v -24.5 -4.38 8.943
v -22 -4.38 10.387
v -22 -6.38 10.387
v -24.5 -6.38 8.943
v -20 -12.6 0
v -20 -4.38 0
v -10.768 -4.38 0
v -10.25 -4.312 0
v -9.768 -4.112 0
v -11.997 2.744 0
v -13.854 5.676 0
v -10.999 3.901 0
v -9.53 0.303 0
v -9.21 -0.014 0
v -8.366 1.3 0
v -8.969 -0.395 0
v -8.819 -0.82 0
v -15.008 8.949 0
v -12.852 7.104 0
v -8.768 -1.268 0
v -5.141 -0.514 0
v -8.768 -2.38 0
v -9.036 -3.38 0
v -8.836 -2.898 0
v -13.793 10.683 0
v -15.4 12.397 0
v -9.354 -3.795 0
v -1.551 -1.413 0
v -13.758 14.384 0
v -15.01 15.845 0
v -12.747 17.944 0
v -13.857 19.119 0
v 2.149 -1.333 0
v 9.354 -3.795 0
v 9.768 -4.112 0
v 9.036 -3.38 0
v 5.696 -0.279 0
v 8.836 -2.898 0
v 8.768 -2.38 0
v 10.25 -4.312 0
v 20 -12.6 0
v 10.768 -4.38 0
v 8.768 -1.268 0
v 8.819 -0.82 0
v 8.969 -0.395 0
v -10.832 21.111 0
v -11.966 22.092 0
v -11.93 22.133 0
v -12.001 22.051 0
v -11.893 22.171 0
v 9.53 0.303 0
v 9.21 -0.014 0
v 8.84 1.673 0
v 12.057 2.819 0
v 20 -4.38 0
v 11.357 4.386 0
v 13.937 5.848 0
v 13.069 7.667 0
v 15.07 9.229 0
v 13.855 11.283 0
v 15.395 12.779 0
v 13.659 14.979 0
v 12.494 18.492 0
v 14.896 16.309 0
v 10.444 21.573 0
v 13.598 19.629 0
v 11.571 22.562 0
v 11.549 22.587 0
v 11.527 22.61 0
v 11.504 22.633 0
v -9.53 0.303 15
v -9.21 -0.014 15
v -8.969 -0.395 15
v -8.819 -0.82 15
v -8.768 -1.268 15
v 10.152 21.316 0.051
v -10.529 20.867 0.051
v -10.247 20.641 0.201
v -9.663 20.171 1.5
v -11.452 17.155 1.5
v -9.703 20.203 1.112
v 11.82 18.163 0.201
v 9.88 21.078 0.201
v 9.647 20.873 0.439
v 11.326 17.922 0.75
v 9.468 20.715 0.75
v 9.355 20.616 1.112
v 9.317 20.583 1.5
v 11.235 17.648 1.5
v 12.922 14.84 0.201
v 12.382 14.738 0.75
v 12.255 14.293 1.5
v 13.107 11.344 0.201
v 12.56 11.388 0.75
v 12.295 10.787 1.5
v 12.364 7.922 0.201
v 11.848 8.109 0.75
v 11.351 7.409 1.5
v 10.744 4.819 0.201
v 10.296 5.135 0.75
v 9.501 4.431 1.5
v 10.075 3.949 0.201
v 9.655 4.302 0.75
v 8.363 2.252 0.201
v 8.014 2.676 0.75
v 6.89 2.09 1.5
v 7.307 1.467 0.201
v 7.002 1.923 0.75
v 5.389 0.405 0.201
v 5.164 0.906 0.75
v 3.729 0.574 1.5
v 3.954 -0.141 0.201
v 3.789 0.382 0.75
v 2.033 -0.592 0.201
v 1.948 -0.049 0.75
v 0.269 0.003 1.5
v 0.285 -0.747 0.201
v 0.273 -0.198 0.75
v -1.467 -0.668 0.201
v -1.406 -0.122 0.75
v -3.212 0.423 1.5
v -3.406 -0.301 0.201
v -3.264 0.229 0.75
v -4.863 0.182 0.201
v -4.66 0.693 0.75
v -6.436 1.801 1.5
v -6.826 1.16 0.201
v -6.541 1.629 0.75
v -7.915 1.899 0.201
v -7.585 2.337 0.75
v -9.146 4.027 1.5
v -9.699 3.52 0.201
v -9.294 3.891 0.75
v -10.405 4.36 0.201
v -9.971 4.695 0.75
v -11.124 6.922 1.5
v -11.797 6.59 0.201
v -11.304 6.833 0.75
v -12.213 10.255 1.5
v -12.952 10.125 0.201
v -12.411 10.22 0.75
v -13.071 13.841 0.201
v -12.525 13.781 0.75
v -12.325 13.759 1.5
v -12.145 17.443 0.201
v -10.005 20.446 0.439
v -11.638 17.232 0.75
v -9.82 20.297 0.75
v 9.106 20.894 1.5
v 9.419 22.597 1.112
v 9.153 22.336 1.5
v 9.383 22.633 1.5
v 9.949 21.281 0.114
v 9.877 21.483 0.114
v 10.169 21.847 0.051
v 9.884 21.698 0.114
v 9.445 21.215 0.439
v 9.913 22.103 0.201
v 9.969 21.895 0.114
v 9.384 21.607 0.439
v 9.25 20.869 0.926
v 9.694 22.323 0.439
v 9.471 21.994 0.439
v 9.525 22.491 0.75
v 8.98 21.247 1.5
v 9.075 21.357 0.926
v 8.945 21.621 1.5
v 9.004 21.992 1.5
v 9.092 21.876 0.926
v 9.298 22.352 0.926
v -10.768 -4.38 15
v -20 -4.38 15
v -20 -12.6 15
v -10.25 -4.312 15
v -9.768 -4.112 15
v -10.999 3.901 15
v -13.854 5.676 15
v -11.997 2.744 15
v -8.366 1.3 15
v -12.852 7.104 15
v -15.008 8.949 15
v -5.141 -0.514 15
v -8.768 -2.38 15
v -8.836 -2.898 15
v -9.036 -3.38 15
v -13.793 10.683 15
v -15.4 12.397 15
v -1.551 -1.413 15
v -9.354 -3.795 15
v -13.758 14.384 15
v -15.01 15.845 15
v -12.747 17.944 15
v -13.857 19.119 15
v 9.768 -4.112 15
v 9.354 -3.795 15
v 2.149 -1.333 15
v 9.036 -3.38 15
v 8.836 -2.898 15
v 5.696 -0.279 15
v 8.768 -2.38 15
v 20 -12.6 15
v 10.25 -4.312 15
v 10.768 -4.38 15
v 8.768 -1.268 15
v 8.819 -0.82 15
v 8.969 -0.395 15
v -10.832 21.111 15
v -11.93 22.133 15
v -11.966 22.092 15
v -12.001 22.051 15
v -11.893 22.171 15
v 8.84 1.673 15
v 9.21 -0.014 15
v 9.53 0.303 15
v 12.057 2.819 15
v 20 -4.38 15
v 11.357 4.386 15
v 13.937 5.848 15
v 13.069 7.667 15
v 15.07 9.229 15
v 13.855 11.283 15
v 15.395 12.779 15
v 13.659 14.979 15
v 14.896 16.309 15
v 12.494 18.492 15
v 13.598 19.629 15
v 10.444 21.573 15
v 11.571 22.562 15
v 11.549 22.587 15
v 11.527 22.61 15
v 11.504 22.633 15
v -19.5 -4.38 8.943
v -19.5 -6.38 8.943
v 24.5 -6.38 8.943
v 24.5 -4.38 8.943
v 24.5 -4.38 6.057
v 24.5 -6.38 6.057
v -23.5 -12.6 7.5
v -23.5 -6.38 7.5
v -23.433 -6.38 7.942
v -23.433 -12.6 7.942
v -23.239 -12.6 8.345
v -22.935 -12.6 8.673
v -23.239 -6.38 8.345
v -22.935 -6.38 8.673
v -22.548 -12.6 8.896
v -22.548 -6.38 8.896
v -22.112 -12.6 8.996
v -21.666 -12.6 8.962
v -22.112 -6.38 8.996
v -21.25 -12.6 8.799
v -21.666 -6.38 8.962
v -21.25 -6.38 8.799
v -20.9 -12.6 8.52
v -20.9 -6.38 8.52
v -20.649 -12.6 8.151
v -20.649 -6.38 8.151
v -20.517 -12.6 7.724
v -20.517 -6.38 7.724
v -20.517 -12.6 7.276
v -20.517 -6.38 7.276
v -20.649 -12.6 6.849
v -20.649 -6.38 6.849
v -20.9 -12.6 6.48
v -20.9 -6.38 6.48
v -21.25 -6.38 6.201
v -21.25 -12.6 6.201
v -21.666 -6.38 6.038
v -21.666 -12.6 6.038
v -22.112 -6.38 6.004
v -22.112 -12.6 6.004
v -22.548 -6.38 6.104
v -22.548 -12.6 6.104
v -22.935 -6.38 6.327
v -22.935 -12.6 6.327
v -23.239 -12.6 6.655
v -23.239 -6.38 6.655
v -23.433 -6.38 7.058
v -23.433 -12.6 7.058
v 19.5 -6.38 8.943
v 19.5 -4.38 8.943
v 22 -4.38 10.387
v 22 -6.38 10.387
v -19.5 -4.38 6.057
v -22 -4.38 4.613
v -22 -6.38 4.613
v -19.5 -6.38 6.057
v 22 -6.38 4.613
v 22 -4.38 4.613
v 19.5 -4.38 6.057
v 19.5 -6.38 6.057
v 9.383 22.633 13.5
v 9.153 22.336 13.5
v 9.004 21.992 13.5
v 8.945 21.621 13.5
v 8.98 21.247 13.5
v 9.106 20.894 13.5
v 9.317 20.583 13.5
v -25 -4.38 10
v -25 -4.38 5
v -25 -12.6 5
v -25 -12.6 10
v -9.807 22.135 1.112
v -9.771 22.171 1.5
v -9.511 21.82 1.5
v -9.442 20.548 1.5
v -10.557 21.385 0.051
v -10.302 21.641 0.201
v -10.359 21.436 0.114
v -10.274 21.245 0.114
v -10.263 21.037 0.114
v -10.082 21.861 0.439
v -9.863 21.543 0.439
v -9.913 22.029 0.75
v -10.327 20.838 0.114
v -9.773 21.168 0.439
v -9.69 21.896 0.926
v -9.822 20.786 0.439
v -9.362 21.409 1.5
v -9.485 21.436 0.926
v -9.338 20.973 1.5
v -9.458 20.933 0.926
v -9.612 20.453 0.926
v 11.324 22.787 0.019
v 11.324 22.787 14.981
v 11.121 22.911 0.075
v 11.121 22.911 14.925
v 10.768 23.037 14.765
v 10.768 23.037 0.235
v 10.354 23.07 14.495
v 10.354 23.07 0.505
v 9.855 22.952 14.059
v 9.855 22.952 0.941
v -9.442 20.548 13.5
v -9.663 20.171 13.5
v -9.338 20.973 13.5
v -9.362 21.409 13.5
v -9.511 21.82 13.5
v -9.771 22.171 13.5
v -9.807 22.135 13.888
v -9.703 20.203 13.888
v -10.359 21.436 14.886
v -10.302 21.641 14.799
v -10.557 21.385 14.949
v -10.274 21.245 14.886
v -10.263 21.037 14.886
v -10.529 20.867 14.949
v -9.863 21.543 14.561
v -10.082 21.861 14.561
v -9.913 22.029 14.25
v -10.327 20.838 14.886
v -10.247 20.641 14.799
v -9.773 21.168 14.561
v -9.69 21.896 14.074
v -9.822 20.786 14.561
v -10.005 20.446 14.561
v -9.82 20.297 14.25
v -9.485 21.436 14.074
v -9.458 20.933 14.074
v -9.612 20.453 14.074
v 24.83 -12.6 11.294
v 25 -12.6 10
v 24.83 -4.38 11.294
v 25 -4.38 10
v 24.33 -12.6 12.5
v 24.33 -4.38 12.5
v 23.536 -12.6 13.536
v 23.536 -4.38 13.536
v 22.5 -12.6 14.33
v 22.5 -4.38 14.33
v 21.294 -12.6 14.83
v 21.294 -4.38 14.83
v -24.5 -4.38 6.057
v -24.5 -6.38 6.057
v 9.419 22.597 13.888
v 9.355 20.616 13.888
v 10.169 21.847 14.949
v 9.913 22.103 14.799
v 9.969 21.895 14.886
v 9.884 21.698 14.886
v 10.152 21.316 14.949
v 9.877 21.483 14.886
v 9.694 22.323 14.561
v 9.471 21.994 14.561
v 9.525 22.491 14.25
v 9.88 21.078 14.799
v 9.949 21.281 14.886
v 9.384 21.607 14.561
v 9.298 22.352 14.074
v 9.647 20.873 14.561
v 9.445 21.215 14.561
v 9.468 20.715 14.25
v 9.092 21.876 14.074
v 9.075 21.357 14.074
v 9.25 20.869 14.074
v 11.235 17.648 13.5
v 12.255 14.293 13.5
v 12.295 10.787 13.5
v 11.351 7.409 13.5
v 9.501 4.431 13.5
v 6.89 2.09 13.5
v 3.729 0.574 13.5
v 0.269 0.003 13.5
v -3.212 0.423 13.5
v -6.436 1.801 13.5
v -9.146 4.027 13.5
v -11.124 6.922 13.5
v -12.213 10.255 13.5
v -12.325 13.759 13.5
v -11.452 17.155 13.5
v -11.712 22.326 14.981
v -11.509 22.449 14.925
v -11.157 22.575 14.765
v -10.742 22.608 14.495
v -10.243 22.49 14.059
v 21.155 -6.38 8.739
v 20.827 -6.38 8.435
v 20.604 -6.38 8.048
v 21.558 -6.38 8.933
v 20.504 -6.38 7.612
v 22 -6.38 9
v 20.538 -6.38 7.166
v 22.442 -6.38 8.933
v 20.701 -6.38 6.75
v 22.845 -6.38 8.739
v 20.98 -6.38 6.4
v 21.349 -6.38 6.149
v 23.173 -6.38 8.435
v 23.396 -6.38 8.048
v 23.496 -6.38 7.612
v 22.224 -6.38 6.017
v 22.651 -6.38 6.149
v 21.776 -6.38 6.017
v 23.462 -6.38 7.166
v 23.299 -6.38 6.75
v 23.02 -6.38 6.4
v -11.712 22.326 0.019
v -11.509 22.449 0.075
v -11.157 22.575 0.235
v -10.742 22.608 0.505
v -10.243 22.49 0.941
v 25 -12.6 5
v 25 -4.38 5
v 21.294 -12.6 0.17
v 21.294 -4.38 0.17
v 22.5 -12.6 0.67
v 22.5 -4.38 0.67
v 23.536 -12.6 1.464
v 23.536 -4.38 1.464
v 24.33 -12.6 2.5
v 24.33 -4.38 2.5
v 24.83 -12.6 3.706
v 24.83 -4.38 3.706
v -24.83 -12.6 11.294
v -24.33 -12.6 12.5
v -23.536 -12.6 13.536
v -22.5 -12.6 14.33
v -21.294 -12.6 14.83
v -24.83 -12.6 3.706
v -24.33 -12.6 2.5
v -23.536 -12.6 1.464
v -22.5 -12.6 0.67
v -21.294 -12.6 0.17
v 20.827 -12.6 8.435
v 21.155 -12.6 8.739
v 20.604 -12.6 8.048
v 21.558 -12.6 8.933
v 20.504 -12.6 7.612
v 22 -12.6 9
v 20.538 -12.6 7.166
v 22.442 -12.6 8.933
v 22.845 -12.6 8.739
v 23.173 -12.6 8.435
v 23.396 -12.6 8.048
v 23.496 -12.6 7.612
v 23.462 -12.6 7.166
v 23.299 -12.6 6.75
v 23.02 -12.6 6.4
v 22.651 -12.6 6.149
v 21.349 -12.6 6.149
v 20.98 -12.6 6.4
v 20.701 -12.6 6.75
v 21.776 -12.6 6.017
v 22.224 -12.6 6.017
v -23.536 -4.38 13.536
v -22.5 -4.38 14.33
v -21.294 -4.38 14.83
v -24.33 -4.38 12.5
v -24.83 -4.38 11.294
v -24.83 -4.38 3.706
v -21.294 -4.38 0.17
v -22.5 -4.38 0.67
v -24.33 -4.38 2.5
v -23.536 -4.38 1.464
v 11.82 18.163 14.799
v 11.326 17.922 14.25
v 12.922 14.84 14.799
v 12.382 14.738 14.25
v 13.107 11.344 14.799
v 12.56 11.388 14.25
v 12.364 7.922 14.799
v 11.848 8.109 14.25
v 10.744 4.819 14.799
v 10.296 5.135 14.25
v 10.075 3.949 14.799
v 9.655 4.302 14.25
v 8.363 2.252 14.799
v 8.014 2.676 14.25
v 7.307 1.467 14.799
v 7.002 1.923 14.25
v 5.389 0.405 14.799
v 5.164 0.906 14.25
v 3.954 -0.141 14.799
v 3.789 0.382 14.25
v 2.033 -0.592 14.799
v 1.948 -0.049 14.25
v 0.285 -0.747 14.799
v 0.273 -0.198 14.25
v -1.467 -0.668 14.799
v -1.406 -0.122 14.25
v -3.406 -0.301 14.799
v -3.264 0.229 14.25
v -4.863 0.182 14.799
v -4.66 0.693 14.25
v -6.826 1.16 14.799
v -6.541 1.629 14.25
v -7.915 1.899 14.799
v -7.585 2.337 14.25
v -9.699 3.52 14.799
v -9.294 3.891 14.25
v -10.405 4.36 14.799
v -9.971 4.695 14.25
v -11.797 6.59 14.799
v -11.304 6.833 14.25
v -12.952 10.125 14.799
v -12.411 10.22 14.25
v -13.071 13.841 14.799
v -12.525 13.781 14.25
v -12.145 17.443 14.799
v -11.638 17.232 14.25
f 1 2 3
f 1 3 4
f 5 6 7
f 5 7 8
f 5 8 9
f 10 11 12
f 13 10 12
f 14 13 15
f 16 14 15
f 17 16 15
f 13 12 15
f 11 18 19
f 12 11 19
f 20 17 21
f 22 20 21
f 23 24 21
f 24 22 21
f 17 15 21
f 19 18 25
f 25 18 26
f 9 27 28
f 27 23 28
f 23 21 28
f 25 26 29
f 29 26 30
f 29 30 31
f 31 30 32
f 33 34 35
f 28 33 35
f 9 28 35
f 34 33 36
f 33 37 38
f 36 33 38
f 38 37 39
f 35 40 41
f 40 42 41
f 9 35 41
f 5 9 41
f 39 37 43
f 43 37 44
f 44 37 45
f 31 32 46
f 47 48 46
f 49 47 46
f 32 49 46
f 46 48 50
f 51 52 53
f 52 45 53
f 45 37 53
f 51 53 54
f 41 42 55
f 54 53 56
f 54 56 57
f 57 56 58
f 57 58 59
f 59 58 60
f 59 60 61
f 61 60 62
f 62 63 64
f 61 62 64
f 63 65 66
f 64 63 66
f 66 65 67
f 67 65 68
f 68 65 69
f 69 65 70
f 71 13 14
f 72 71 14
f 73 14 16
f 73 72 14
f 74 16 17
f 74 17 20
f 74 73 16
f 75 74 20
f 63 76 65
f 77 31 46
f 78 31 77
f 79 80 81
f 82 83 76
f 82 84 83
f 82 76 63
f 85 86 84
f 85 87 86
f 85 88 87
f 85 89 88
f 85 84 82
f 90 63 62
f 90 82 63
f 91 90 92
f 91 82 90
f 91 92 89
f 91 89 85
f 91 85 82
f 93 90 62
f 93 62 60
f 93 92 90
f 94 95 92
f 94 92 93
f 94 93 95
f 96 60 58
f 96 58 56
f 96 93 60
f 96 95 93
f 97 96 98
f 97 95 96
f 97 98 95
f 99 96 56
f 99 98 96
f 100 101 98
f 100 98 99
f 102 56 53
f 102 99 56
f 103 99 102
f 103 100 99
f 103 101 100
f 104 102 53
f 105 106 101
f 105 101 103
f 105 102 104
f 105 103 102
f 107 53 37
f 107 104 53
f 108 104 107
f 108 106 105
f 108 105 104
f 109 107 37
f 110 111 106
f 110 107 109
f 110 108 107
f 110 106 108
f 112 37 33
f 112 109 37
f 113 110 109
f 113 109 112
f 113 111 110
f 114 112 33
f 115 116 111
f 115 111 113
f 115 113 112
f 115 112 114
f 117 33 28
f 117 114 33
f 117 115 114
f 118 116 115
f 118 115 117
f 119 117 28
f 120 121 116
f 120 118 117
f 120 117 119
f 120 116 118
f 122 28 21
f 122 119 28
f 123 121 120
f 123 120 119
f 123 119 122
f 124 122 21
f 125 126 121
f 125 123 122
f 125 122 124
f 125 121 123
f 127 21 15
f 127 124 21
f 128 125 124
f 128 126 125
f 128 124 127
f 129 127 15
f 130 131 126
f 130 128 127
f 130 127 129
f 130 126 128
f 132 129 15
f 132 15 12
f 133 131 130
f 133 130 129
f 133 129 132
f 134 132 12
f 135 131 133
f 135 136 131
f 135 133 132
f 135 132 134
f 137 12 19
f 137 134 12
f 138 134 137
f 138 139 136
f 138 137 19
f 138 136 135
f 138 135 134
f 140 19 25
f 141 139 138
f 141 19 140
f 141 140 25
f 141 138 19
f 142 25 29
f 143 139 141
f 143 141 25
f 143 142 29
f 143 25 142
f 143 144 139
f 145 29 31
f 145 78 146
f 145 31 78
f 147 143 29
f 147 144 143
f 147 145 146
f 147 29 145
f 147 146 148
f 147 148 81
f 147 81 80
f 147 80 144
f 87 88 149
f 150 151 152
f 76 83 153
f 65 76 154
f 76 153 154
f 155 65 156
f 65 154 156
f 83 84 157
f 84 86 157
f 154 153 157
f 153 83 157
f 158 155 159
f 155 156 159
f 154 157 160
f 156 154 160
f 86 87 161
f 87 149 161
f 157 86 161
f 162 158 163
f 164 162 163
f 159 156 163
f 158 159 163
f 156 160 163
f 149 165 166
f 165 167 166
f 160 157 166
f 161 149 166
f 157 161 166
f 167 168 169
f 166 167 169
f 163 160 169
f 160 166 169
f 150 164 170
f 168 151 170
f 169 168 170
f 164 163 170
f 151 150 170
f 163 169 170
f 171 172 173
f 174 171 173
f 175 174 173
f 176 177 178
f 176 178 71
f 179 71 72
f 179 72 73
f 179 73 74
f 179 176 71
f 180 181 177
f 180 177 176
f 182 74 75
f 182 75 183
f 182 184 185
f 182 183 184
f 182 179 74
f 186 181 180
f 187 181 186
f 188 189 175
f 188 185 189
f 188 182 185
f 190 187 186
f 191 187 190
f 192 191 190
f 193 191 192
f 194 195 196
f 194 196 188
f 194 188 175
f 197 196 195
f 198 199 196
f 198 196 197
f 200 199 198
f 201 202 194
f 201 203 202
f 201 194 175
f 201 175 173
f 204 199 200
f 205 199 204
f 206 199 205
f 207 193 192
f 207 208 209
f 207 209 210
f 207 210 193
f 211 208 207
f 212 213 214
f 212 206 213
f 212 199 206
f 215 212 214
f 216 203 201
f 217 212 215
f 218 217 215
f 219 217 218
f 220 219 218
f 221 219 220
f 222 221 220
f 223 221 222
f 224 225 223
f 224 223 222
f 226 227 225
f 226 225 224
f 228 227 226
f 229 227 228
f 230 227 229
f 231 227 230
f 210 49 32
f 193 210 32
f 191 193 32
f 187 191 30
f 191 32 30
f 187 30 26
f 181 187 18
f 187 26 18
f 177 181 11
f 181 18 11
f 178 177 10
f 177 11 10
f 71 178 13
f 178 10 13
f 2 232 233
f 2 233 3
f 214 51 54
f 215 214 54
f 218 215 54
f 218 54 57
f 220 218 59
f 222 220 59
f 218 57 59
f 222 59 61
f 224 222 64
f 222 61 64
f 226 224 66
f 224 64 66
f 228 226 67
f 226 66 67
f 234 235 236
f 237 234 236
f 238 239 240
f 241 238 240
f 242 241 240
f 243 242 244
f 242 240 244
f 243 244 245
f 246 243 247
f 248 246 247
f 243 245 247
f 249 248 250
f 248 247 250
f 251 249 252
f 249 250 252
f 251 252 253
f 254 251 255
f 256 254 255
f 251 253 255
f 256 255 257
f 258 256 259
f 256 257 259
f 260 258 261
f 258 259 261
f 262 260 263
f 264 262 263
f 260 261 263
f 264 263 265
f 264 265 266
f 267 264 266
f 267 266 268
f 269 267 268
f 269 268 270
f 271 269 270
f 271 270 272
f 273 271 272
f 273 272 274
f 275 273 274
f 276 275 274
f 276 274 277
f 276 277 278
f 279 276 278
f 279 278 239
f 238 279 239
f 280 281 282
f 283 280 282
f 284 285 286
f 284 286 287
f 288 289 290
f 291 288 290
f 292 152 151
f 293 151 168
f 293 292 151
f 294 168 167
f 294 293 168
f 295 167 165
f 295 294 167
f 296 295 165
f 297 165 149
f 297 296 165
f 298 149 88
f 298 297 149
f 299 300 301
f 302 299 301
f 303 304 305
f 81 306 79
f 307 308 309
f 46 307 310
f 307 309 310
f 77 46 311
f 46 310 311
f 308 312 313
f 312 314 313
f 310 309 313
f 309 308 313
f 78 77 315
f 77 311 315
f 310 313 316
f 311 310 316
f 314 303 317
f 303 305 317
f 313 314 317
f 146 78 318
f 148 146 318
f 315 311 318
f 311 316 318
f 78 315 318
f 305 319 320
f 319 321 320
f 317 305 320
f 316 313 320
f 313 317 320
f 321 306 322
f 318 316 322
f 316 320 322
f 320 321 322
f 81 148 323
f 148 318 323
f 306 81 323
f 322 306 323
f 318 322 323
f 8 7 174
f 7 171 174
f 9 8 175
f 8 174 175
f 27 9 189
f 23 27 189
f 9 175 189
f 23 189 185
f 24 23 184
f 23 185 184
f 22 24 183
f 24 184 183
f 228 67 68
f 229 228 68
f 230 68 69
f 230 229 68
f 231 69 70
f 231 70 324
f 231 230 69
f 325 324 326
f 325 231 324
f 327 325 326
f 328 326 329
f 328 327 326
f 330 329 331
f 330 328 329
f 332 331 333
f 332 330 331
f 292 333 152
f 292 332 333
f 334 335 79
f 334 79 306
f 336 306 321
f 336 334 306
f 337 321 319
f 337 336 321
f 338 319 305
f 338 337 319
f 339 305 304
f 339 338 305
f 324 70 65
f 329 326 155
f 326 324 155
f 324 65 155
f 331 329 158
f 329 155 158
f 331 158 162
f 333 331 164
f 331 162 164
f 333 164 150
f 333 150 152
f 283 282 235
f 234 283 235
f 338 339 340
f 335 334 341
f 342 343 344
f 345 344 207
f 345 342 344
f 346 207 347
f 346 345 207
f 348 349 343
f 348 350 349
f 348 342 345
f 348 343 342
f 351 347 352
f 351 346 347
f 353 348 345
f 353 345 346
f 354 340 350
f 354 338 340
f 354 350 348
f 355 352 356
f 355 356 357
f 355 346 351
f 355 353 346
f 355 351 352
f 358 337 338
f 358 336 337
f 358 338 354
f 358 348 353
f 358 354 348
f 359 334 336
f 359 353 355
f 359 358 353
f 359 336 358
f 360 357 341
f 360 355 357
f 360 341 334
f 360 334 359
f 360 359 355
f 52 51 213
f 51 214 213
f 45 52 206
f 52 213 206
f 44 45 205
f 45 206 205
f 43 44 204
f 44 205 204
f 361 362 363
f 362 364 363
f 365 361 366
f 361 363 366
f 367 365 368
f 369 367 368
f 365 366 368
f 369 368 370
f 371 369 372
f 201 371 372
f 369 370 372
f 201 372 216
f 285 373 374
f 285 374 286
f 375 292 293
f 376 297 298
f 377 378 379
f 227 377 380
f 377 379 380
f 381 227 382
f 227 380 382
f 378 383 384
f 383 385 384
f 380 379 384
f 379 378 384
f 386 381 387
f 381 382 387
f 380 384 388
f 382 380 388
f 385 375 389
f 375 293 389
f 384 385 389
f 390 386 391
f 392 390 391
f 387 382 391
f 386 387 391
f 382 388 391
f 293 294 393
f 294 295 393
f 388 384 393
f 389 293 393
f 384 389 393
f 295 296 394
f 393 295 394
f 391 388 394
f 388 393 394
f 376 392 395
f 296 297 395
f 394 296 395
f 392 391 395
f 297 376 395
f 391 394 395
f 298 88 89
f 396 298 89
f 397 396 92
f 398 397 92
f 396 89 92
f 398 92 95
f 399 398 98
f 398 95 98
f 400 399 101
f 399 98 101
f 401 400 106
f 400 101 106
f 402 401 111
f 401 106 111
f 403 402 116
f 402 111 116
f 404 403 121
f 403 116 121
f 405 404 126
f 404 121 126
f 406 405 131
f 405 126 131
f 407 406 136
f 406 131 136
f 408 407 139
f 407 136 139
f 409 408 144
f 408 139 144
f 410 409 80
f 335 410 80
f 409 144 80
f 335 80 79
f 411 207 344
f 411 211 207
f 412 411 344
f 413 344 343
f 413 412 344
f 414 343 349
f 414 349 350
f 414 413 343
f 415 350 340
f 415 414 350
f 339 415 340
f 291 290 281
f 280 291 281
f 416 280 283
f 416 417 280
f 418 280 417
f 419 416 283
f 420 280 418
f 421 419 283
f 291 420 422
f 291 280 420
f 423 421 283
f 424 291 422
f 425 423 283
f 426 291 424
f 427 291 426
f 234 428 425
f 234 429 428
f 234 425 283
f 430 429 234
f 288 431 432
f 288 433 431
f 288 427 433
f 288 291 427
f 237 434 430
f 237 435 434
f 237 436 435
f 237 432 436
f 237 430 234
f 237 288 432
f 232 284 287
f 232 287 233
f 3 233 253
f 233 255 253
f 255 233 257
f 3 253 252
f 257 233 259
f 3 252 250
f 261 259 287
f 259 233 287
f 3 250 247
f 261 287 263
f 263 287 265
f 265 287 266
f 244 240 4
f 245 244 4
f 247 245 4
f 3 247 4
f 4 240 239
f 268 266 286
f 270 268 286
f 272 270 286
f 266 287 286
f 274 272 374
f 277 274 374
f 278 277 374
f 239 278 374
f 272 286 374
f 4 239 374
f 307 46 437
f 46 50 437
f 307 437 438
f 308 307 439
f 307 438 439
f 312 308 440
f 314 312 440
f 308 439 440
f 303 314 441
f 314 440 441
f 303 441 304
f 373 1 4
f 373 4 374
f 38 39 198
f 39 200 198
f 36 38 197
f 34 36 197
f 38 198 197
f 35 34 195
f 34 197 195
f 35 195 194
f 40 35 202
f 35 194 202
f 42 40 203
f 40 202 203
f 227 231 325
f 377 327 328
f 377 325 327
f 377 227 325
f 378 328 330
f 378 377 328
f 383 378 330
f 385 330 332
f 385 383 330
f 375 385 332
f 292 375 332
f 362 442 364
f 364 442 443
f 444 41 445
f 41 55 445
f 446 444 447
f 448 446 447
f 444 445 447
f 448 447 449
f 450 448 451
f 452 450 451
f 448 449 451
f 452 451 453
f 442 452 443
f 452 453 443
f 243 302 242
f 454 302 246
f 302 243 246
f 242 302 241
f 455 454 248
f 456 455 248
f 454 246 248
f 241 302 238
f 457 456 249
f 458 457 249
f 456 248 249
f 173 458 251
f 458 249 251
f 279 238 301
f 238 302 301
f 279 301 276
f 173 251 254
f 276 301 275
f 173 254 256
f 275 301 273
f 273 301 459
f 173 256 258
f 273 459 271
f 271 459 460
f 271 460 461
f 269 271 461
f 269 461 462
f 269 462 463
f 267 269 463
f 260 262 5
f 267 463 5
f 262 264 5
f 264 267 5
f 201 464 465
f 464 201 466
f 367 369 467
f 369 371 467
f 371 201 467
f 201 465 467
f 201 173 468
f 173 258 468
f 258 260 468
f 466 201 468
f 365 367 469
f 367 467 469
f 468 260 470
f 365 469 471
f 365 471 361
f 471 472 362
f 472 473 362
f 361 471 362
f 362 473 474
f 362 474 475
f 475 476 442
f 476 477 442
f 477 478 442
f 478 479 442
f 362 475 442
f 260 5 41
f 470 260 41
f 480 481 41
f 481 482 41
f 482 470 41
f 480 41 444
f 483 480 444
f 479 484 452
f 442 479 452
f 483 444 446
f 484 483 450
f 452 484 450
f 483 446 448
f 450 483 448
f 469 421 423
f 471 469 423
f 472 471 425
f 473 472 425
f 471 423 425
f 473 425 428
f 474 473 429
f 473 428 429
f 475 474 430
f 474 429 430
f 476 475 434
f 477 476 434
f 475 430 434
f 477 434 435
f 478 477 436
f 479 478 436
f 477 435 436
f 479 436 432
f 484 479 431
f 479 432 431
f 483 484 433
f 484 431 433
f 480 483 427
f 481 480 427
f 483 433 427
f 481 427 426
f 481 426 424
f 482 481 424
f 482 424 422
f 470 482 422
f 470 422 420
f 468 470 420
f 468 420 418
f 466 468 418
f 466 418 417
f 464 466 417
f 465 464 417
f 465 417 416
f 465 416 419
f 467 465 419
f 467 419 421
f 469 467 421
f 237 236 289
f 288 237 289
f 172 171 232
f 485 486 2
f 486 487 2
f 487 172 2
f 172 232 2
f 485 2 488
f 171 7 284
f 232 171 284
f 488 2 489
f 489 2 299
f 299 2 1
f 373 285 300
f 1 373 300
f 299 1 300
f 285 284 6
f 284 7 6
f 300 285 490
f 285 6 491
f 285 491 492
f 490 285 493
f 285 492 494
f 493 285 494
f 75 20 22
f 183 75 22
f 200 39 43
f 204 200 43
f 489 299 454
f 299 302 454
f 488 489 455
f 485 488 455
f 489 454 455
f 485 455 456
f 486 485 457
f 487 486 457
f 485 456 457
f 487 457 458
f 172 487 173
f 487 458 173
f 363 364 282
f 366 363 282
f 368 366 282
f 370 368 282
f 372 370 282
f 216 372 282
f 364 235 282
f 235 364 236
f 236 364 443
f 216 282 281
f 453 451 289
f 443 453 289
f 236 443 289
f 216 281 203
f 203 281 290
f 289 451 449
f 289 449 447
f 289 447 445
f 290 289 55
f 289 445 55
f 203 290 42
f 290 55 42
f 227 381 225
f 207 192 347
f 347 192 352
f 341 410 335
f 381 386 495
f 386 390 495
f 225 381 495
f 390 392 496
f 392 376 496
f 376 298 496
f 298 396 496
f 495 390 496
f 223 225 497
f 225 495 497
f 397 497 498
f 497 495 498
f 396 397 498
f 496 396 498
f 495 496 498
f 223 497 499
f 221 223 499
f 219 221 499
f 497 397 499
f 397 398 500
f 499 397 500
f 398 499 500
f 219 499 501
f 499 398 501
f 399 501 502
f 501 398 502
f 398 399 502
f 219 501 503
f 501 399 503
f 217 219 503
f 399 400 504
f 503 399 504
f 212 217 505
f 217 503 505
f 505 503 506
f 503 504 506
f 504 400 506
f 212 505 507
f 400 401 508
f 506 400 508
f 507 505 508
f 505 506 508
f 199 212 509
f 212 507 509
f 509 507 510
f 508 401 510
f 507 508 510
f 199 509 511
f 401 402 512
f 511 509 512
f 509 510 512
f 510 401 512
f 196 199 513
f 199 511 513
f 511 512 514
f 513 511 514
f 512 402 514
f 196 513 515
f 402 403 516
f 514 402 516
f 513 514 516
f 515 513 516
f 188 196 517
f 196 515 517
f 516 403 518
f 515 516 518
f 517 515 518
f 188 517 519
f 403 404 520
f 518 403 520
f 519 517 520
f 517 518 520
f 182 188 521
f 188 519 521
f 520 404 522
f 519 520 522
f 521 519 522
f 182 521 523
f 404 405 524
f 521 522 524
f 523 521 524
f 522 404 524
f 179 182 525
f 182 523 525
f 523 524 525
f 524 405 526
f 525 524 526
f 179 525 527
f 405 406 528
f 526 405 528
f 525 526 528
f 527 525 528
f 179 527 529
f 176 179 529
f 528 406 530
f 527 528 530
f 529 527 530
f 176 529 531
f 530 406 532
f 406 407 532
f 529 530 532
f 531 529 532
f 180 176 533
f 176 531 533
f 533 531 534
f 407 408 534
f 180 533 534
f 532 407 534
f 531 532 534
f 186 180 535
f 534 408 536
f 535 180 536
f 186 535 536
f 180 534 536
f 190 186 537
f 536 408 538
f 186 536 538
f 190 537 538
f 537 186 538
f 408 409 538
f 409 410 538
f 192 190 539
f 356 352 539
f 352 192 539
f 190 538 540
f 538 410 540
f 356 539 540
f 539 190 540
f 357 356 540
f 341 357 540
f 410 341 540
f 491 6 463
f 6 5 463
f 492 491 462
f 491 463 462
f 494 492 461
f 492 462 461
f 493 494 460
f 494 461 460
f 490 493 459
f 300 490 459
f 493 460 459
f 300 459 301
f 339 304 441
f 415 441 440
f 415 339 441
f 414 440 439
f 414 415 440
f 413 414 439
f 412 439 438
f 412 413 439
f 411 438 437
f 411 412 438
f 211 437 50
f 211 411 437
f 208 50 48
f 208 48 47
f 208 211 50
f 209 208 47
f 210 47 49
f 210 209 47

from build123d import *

# Parameters (mm, degrees)
RESSALTO_EXTRUS_O1_DEPTH = 15
ESBO_O3_R                = 1.5
CORTE_EXTRUS_O1_DEPTH    = 8.219669914
CORTE_EXTRUS_O2_DEPTH    = 2
FILETE1_R                = 1.5
FILETE2_R                = 2
FILETE3_R                = 5


with BuildPart() as part:
    # Esboço2 → Ressalto-extrusão1 (new body)
    with BuildSketch(Plane.XY):
        with BuildLine():
            Line((-25, -4.380330086), (-25, -12.6))
            Line((-25, -12.6), (25, -12.6))
            Line((25, -12.6), (25, -4.380330086))
            Line((25, -4.380330086), (8.768124087, -4.380330086))
            Line((8.768124087, -4.380330086), (8.768124087, -0.260173774))
            ThreePointArc((8.768124087, -0.260173774), (15.361943152, 11.318009898), (10.456147688, 23.706147688))
            Line((10.456147688, 23.706147688), (8.332817936, 21.582817936))
            ThreePointArc((8.332817936, 21.582817936), (0.30060873, 0.00364431), (-8.768124087, 21.168124087))
            Line((-8.768124087, 21.168124087), (-10.88944443, 23.28944443))
            ThreePointArc((-10.88944443, 23.28944443), (-15.337898467, 11.018381166), (-8.768124087, -0.260173774))
            Line((-8.768124087, -0.260173774), (-8.768124087, -4.380330086))
            Line((-8.768124087, -4.380330086), (-25, -4.380330086))
        make_face()
    extrude(amount=RESSALTO_EXTRUS_O1_DEPTH)

    # Esboço3 → Corte-extrusão1 (cut)
    with BuildSketch(Plane(origin=(0, -4.380330086, 0), x_dir=(1, 0, 0), z_dir=(0, 1, 0))):
        with Locations(Location((22, -7.5, 0), (0, 0, 270))):
            Circle(ESBO_O3_R)
        with Locations(Location((-22, -7.5, 0), (0, 0, 180))):
            Circle(ESBO_O3_R)
    extrude(amount=-CORTE_EXTRUS_O1_DEPTH, mode=Mode.SUBTRACT)

    # Esboço5 → Corte-extrusão2 (cut)
    with BuildSketch(Plane(origin=(0, -4.380330086, 0), x_dir=(1, 0, 0), z_dir=(0, 1, 0))):
        Polygon((22, -4.613248654), (19.5, -6.056624327), (19.5, -8.943375673), (22, -10.386751346), (24.5, -8.943375673), (24.5, -6.056624327), align=None)
        Polygon((-24.5, -6.056624327), (-22, -4.613248654), (-19.5, -6.056624327), (-19.5, -8.943375673), (-22, -10.386751346), (-24.5, -8.943375673), align=None)
    extrude(amount=-CORTE_EXTRUS_O2_DEPTH, mode=Mode.SUBTRACT)

    # Filete1
    filete1_edges = [part.edges().sort_by_distance(p)[0] for p in [
        (9.394482812, 22.644482812, 15),
        (-9.828784258, 22.228784258, 0),
        (0.30060873, 0.00364431, 0),
        (9.394482812, 22.644482812, 0),
        (0.30060873, 0.00364431, 15),
        (-10.88944443, 23.28944443, 7.5),
        (-8.768124087, 21.168124087, 7.5),
        (8.332817936, 21.582817936, 7.5),
        (10.456147688, 23.706147688, 7.5),
        (-9.828784258, 22.228784258, 15),
    ]]
    fillet(filete1_edges, radius=FILETE1_R - 0.0001)  # a hair under: the kernel refuses the full size

    # Filete2
    filete2_edges = [part.edges().sort_by_distance(p)[0] for p in [
        (8.768124087, -4.380330086, 7.5),
        (-8.768124087, -4.380330086, 7.5),
        (-8.768124087, -0.260173774, 7.5),
        (8.768124087, -0.260173774, 7.5),
    ]]
    fillet(filete2_edges, radius=FILETE2_R)

    # Filete3
    filete3_edges = [part.edges().sort_by_distance(p)[0] for p in [
        (25, -8.490165043, 0),
        (-25, -8.490165043, 0),
        (-25, -8.490165043, 15),
        (25, -8.490165043, 15),
    ]]
    fillet(filete3_edges, radius=FILETE3_R)


solid = part.part
